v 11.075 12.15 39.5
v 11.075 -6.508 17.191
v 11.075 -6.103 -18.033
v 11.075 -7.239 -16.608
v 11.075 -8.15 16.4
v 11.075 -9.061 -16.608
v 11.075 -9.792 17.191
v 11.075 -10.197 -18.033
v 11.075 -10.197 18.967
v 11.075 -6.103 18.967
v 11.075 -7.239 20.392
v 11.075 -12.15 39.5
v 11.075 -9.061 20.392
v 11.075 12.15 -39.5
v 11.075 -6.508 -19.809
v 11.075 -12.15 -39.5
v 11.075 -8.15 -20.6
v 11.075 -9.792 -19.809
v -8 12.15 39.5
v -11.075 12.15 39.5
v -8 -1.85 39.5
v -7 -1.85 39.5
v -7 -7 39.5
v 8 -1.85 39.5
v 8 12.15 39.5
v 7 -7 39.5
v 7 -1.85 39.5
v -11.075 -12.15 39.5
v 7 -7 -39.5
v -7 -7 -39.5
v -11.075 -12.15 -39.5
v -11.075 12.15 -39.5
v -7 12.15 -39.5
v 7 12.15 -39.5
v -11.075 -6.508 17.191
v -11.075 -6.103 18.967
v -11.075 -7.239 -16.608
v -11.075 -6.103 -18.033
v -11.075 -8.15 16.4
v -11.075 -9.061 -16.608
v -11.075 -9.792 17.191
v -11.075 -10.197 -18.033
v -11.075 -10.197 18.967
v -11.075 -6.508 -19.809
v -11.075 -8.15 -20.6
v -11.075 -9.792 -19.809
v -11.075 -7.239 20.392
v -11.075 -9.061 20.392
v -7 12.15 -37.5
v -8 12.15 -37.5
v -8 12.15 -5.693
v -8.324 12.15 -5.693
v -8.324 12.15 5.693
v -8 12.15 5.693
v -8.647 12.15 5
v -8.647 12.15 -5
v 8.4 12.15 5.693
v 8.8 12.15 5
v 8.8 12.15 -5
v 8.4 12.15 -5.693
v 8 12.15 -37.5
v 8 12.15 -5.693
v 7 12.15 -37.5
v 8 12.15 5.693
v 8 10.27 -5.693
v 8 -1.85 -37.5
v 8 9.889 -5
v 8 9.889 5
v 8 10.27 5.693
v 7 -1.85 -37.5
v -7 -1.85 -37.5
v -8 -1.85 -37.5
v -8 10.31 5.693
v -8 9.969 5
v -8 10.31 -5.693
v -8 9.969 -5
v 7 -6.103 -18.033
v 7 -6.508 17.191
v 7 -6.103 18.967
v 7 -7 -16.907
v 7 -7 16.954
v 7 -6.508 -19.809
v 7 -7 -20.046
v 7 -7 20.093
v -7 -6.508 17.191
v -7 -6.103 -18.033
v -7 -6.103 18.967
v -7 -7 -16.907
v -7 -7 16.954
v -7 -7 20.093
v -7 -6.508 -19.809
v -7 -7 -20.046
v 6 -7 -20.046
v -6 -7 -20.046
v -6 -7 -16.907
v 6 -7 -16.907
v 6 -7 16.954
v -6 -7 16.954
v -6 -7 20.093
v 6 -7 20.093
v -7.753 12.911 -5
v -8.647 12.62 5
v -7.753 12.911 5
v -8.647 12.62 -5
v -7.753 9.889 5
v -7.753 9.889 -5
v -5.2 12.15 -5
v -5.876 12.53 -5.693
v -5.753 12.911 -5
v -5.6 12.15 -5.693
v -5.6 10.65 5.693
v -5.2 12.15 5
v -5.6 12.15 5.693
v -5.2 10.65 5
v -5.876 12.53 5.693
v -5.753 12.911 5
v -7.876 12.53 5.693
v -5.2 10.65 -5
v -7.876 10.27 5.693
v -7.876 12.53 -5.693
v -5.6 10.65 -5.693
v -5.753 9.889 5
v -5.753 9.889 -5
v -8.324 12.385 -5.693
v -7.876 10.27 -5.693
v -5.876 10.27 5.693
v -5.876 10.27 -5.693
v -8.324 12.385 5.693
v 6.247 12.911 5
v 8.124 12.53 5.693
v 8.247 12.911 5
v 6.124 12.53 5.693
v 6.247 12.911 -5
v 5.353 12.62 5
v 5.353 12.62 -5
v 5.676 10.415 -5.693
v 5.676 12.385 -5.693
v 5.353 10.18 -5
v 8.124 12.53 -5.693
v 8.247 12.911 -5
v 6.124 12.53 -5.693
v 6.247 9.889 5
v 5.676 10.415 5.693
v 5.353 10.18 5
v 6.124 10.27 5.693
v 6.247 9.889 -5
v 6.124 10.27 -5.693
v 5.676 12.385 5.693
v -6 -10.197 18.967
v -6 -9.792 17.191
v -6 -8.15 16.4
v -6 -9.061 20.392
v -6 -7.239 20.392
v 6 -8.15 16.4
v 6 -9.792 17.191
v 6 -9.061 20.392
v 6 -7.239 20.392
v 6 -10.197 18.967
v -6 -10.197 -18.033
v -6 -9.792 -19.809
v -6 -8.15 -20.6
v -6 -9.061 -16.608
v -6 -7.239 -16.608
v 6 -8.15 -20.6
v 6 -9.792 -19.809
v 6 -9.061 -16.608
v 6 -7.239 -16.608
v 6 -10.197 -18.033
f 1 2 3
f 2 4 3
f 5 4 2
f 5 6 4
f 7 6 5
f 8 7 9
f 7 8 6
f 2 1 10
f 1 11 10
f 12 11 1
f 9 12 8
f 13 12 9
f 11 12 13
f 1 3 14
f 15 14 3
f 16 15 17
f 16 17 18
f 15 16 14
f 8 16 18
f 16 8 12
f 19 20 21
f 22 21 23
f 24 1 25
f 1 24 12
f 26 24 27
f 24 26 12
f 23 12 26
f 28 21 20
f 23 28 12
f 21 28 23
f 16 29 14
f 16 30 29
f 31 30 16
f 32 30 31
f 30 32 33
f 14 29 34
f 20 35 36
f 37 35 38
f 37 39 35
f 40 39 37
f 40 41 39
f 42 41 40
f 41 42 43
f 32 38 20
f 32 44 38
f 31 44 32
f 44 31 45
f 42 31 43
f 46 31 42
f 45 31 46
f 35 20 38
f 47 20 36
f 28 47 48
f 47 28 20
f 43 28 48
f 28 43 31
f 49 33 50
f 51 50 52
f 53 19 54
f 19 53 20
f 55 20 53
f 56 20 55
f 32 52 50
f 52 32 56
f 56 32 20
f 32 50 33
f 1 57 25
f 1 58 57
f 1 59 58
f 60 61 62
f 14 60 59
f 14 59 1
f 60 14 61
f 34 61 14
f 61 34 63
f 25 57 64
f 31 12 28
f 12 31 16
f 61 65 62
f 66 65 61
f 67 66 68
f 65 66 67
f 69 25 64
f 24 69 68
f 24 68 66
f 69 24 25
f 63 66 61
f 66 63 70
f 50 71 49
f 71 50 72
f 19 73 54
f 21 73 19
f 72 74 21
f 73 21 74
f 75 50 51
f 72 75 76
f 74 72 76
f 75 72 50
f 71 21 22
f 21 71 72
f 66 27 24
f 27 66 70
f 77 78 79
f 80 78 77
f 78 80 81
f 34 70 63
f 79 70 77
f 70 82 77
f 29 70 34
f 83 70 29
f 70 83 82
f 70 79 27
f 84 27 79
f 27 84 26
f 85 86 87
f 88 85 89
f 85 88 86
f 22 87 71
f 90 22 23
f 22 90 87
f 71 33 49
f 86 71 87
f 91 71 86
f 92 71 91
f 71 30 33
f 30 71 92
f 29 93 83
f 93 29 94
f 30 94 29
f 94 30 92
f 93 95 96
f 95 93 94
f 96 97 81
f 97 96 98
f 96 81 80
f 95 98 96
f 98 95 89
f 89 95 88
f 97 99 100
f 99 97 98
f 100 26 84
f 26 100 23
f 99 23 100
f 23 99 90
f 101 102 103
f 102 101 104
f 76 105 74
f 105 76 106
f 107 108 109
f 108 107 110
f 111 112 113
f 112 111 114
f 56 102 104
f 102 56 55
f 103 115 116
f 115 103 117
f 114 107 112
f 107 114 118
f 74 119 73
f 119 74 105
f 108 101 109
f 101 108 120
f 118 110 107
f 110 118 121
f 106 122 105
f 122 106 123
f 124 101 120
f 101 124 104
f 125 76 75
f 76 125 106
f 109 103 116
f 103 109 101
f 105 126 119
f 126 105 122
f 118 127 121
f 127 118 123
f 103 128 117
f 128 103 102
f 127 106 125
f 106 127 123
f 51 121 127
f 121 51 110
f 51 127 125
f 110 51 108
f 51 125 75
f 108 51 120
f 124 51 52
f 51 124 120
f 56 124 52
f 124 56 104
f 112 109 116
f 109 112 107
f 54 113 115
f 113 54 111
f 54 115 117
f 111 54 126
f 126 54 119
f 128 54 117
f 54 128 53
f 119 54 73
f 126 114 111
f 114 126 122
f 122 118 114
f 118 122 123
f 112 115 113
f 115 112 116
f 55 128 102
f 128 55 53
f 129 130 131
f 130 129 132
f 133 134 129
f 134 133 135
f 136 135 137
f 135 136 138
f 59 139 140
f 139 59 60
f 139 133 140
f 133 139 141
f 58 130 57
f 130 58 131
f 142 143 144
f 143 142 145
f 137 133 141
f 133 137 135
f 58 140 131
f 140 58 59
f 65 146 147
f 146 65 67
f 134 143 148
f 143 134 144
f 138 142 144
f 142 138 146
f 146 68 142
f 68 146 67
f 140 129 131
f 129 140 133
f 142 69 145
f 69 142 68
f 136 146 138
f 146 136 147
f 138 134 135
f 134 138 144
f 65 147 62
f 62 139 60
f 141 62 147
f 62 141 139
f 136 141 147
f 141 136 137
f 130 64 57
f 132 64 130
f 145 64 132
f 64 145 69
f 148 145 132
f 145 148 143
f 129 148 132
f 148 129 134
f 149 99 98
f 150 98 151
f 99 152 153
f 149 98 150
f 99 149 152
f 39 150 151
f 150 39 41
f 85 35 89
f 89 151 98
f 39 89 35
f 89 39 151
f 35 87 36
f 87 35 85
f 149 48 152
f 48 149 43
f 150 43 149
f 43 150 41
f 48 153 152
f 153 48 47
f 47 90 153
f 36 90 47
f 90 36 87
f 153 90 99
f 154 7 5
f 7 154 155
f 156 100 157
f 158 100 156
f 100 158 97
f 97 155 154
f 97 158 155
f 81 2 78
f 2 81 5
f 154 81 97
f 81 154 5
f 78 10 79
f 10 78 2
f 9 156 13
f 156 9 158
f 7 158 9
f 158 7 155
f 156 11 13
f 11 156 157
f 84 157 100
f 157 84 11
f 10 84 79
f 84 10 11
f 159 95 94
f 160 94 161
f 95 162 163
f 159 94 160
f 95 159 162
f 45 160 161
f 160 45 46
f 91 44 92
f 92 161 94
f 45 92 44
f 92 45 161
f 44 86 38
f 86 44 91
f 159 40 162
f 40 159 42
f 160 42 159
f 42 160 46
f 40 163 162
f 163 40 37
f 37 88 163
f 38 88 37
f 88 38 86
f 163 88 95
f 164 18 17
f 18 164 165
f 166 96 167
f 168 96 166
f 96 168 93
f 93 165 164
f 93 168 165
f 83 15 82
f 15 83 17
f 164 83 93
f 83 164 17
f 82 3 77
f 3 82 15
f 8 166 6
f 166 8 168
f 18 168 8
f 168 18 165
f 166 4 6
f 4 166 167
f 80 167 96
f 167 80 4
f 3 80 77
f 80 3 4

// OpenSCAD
// Parameters
bbox_x = 22.15; //[11.08:44.3:0.01]
bbox_y = 24.3; //[12.15:48.6:0.01]
bbox_z = 79; //[39.5:158:0.1]
wall_t = 2; //[1:4:0.1]
channel_w = 16; //[8:20.15:0.1]
channel_d = 14; //[7:22.3:0.1]
back_round_r = 11.075; //[5.54:22.15:0.01]
front_open_w = 14; //[6:20.15:0.1]
pin_hole_d = 4; //[2:8:0.1]
pin_feature_len = 6; //[3:12:0.1]
pin_z_upper = 58; //[39.5:75:0.1]
pin_z_lower = 21; //[4:39.5:0.1]
pin_y_offset_from_inner_face = 0; //[-2:2:0.1]
tab_len = 2; //[1:6:0.1]
tab_thk = 1.5; //[0.8:3:0.1]
tab_z_pos = 39.5; //[10:69:0.1]
tab_z_h = 10; //[4:20:0.1]
overlap = 1; //[0.5:2:0.1]
pin_clear = 0.2; //[0:0.6:0.05]
rib_thk = 1.2; //[0.8:2.5:0.1]
rib_z_h = 8; //[4:16:0.1]
edge_round_r = 0.8; //[0.3:2:0.1]

// Base Shapes
module u_channel_body_outer_box() {
  cube([bbox_x, bbox_y, bbox_z], center=true);
}

module rounded_outer_back_cyl() {
  rotate([90, 0, 0])
    cylinder(r=back_round_r, h=bbox_z, center=true);
}

module open_front_gap_box() {
  translate([0, (bbox_y - channel_d)/2 + overlap, 0])
    cube([front_open_w, bbox_y + overlap*2, bbox_z + overlap*2], center=true);
}

module inner_channel_void_box() {
  translate([0, (bbox_y - channel_d)/2, wall_t/2])
    cube([channel_w, channel_d, bbox_z - wall_t], center=true);
}

module side_wall_pin_feature(pos_x, pos_z) {
  translate([pos_x, -bbox_y/2 + wall_t + pin_hole_d/2 + pin_y_offset_from_inner_face, pos_z])
    rotate([0, 90, 0])
      cylinder(r=(pin_hole_d + pin_clear)/2, h=pin_feature_len, center=true);
}

module front_edge_tab(pos_x) {
  translate([pos_x, bbox_y/2 - tab_thk/2, tab_z_pos - bbox_z/2])
    cube([tab_len, tab_thk, tab_z_h], center=true);
}

module boss_reinforcement_rib(pos_x, pos_z) {
  translate([pos_x, -bbox_y/2 + wall_t + rib_thk/2, pos_z])
    cube([wall_t + overlap*2, rib_thk, rib_z_h], center=true);
}

// Operations
module u_channel_body_outer_union() {
  union() {
    u_channel_body_outer_box();
    rounded_outer_back_cyl();
  }
}

module u_channel_body() {
  intersection() {
    u_channel_body_outer_union();
    u_channel_body_outer_box();
  }
}

module u_channel_body_hollowed() {
  difference() {
    u_channel_body();
    inner_channel_void_box();
    open_front_gap_box();
  }
}

module tabs_union_raw() {
  union() {
    front_edge_tab(-front_open_w/2 + tab_len/2 - overlap);
    front_edge_tab(front_open_w/2 - tab_len/2 + overlap);
  }
}

module edge_rounding_on_tabs() {
  minkowski() {
    tabs_union_raw();
    sphere(r=edge_round_r);
  }
}

module boss_reinforcement_ribs() {
  union() {
    boss_reinforcement_rib(-channel_w/2 - wall_t/2, pin_z_upper - bbox_z/2);
    boss_reinforcement_rib(channel_w/2 + wall_t/2, pin_z_upper - bbox_z/2);
    boss_reinforcement_rib(-channel_w/2 - wall_t/2, pin_z_lower - bbox_z/2);
    boss_reinforcement_rib(channel_w/2 + wall_t/2, pin_z_lower - bbox_z/2);
  }
}

module clip_with_tabs_and_ribs() {
  union() {
    u_channel_body_hollowed();
    edge_rounding_on_tabs();
    boss_reinforcement_ribs();
  }
}

module pin_holes_all() {
  union() {
    side_wall_pin_feature(-channel_w/2 - wall_t/2, pin_z_upper - bbox_z/2);
    side_wall_pin_feature(channel_w/2 + wall_t/2, pin_z_upper - bbox_z/2);
    side_wall_pin_feature(-channel_w/2 - wall_t/2, pin_z_lower - bbox_z/2);
    side_wall_pin_feature(channel_w/2 + wall_t/2, pin_z_lower - bbox_z/2);
  }
}

module clip_with_pin_holes() {
  difference() {
    clip_with_tabs_and_ribs();
    pin_holes_all();
  }
}

module draft_angles() {
  union() {
    clip_with_pin_holes();
  }
}

// Final Output
draft_angles();
